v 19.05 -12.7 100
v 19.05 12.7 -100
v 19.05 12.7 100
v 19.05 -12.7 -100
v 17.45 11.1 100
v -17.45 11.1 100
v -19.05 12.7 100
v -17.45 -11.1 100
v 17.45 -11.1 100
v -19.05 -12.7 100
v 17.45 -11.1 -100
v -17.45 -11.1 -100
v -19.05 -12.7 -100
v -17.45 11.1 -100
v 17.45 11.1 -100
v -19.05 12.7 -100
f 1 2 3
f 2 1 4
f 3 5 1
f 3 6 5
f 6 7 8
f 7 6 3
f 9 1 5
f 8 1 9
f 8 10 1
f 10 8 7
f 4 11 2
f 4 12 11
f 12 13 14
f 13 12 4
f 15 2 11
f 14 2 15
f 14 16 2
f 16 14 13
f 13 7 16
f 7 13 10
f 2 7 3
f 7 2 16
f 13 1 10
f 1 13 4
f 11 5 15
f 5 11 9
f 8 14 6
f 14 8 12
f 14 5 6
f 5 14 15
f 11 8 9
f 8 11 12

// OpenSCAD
// Aluminium rectangular hollow box section: 38.1mm x 25.4mm x 1.6mm wall

outer_width_mm     = 38.1;
outer_height_mm    = 25.4;
wall_thickness_mm  = 1.6;
length_mm          = 200;

eps_mm = 0.02;

module box_section_rect_tube(ow, oh, t, L, center=true) {
    iw = ow - 2*t;
    ih = oh - 2*t;

    assert(iw > 0 && ih > 0, "Wall thickness too large for given outer dimensions.");

    difference() {
        cube([ow, oh, L], center=center);
        // Inner void: slightly longer to guarantee clean subtraction through the ends
        cube([iw, ih, L + 2*eps_mm], center=center);
    }
}

box_section_rect_tube(outer_width_mm, outer_height_mm, wall_thickness_mm, length_mm, true);
